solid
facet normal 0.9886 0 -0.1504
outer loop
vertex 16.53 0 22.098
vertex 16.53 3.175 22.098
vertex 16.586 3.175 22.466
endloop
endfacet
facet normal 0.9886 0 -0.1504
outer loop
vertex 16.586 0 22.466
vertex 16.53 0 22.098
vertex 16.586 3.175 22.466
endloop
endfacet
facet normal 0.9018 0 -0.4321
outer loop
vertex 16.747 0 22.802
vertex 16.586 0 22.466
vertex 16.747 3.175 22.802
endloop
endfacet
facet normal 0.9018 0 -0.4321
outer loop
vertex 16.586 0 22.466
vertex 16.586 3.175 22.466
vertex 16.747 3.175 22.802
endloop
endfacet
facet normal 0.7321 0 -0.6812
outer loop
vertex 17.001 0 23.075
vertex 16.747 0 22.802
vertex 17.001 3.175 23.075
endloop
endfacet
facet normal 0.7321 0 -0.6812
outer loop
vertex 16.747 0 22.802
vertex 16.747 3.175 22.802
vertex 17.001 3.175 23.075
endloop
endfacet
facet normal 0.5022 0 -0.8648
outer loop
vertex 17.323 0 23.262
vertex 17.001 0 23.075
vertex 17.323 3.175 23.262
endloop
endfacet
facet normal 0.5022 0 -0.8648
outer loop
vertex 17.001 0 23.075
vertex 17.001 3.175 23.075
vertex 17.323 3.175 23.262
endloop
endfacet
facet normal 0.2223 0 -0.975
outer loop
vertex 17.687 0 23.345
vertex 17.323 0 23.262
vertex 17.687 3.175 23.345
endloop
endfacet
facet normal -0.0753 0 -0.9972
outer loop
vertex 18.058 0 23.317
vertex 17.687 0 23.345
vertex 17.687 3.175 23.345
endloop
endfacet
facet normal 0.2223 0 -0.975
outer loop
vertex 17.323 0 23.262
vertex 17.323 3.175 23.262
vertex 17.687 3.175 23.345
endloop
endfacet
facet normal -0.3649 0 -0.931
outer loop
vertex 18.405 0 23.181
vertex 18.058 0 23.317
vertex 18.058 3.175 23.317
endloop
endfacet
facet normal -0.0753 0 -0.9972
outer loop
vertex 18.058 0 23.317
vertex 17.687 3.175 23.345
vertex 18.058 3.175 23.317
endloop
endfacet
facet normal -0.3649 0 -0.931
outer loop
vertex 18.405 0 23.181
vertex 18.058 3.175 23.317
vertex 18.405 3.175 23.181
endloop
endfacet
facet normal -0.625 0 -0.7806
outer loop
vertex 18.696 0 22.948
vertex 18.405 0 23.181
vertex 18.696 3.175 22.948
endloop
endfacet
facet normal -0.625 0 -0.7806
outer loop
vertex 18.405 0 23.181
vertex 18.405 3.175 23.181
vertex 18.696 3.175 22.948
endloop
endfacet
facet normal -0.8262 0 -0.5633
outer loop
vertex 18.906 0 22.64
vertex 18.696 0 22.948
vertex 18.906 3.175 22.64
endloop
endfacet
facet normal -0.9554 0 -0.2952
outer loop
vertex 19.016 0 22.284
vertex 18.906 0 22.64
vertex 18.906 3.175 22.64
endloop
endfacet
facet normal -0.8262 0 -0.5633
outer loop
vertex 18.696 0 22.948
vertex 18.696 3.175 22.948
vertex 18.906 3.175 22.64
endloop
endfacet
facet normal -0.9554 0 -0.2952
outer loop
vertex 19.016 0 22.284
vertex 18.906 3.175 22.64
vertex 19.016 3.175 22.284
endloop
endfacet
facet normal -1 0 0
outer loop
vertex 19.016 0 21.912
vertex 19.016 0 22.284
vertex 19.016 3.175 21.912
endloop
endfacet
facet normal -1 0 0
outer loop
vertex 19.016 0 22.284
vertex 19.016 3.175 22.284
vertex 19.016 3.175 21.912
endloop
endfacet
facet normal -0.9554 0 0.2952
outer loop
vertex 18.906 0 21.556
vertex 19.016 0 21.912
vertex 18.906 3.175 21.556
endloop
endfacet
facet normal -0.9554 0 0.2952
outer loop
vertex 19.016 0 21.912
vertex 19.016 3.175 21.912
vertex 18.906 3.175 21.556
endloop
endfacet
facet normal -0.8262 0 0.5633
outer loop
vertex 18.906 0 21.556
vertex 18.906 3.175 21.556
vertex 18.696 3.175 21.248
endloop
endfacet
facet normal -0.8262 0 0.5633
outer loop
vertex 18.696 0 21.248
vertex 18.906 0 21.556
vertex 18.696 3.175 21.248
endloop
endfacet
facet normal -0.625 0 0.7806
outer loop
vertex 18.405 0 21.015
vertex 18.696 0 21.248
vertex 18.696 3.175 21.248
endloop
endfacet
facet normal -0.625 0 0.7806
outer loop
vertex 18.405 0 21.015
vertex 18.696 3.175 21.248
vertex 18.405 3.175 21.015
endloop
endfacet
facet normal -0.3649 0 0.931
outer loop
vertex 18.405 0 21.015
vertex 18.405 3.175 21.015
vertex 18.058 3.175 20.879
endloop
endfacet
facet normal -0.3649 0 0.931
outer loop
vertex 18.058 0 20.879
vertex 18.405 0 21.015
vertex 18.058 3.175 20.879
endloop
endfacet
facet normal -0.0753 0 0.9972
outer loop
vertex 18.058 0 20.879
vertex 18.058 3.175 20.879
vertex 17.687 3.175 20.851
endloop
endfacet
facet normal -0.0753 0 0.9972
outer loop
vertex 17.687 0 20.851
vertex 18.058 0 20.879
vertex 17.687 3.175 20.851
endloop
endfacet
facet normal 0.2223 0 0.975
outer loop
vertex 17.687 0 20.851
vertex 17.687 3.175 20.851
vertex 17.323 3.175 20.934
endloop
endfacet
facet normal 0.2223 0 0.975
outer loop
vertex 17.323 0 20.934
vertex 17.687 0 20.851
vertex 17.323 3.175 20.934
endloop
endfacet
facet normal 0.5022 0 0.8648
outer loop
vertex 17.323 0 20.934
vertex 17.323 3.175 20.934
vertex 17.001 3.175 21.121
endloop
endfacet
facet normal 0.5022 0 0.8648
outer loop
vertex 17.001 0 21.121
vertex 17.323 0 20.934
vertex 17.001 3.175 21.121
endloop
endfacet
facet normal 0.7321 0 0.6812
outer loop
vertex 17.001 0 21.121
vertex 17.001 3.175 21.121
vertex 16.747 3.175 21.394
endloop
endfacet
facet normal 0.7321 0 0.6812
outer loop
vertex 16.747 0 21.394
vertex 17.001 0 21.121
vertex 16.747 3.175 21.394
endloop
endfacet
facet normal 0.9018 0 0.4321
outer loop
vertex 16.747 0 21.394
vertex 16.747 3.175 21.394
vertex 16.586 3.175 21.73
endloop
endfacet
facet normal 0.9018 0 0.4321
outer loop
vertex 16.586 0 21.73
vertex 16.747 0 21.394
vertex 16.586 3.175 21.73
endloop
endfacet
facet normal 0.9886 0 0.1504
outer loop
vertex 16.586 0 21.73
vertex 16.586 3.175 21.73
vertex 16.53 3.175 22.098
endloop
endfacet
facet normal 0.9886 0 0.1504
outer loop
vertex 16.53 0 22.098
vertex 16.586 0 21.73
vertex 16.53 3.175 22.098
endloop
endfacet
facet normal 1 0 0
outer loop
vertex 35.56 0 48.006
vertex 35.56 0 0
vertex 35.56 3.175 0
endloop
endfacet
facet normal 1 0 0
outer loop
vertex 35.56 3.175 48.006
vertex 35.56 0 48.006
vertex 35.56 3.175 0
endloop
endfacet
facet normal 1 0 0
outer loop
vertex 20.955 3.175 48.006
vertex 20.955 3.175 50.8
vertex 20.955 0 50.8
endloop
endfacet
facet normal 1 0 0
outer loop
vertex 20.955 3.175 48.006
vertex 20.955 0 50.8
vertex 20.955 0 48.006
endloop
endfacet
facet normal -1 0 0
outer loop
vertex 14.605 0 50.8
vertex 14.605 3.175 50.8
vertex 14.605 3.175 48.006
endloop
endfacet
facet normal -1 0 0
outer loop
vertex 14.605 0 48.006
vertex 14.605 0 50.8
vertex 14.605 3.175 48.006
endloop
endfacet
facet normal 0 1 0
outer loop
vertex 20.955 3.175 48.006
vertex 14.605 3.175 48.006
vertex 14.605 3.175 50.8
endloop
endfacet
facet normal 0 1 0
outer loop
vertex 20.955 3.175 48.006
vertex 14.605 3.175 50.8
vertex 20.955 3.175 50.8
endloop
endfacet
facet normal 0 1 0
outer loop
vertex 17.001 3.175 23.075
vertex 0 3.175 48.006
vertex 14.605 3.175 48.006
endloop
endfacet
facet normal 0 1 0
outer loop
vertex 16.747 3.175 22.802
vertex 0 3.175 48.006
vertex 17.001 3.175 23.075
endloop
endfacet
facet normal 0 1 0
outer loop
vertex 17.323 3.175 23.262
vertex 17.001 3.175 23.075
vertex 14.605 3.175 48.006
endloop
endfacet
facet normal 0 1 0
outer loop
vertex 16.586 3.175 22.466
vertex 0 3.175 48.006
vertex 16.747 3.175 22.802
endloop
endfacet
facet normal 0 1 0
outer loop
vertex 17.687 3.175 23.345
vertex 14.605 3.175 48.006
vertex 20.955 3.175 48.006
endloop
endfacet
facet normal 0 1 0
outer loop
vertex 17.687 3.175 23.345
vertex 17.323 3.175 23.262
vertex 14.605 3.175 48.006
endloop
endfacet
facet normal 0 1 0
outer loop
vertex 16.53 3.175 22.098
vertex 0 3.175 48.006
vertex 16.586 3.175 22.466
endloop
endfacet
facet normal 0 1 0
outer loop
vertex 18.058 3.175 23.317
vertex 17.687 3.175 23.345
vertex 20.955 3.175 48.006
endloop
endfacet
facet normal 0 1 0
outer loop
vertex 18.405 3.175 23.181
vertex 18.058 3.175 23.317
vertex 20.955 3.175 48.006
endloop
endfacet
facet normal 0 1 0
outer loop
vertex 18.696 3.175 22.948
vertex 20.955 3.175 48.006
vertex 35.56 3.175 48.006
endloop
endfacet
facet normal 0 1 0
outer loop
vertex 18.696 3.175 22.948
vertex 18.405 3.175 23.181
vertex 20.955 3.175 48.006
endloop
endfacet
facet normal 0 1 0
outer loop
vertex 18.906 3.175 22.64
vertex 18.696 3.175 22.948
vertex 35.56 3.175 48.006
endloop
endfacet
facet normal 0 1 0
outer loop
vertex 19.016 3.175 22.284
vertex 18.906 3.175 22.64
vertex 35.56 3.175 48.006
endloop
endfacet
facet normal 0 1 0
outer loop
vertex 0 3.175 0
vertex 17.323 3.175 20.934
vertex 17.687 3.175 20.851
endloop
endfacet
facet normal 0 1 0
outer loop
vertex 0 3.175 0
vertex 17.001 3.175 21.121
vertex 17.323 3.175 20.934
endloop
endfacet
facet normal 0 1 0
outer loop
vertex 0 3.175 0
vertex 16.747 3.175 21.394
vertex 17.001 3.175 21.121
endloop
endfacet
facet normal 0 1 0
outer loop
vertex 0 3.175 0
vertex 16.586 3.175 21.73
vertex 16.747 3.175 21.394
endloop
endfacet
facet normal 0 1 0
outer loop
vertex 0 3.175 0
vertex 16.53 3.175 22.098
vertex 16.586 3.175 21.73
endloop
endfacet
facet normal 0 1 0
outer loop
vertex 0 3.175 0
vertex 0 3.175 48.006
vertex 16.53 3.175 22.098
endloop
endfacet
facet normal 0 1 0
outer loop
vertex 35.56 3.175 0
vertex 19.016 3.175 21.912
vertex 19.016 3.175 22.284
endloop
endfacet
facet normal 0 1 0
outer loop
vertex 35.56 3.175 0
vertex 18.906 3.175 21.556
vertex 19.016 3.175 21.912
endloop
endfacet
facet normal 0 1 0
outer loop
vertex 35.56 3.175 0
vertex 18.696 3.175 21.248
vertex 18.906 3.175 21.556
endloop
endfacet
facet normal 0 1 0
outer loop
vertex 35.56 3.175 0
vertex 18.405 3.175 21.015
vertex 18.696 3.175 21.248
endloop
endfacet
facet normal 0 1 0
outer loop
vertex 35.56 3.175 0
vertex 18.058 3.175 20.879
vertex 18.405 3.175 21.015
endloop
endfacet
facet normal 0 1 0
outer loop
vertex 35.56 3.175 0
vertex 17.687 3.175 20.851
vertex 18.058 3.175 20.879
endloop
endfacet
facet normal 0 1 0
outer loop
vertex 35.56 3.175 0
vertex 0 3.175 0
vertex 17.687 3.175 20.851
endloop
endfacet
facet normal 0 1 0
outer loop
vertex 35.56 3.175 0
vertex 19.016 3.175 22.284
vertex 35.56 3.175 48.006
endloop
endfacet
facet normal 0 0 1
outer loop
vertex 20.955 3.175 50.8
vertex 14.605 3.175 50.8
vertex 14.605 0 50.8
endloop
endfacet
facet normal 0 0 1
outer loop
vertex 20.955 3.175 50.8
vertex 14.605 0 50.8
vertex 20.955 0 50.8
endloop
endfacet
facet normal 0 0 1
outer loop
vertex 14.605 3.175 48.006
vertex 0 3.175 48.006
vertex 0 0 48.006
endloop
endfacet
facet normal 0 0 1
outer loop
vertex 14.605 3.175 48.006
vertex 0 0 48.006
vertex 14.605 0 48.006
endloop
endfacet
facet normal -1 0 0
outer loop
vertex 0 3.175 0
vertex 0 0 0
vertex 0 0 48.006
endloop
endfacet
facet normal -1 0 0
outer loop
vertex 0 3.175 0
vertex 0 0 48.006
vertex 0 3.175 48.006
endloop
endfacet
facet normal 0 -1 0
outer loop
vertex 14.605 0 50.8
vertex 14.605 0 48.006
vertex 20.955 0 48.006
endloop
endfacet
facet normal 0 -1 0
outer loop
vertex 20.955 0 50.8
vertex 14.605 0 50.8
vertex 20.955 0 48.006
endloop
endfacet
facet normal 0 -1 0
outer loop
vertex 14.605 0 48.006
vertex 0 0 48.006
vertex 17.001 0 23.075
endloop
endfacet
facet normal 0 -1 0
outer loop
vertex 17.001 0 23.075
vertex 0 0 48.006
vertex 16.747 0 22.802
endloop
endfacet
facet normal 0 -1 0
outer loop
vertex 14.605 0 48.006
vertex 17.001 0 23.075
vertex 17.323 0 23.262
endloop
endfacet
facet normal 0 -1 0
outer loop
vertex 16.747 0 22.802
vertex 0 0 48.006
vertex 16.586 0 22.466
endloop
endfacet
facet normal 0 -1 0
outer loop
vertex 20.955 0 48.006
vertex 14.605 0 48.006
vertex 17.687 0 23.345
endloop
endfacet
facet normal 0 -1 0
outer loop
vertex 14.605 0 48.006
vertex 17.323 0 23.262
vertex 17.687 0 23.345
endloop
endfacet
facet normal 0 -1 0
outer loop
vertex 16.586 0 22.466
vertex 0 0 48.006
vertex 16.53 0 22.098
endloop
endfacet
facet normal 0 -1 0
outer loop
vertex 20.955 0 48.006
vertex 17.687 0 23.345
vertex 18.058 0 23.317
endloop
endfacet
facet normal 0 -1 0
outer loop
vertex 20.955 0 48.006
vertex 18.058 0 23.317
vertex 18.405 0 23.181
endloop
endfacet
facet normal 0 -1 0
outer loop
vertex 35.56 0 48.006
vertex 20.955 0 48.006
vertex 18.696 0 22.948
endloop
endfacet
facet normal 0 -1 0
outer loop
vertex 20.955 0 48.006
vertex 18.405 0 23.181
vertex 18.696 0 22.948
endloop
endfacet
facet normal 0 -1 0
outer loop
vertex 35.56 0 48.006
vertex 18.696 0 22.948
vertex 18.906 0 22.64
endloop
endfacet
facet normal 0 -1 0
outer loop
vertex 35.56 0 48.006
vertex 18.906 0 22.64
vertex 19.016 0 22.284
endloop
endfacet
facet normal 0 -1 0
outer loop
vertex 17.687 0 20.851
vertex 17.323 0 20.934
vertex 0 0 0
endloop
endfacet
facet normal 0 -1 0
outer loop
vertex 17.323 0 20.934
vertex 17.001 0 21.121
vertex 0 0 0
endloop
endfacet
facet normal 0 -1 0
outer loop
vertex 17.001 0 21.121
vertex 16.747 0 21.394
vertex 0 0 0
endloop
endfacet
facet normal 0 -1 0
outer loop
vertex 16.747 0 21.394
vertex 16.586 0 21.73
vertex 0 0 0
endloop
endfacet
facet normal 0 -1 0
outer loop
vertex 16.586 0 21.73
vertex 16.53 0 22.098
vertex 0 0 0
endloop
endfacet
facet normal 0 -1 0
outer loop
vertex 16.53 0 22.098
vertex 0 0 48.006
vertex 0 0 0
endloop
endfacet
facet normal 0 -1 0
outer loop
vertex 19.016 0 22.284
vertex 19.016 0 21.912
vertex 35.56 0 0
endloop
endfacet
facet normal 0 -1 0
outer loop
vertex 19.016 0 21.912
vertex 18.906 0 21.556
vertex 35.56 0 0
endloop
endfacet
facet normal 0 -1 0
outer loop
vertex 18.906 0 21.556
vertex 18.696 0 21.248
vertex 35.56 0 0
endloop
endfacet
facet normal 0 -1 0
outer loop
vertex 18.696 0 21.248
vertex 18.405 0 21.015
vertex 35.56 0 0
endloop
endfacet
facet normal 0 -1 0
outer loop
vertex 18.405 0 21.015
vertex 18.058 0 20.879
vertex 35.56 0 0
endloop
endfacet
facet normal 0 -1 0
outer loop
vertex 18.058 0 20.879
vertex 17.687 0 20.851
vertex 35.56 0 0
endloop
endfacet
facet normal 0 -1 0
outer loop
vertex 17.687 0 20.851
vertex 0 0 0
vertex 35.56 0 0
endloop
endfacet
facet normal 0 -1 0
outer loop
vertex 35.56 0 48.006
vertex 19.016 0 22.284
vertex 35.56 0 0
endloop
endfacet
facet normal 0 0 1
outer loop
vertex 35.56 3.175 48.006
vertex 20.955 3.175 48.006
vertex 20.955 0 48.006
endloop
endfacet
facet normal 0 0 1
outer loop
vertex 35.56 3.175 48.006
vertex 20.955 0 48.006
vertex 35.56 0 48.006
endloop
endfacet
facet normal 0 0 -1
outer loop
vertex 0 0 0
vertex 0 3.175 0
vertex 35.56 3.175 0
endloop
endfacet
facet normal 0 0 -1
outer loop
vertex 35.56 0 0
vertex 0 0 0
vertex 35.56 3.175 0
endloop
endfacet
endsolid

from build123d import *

# Parameters (mm, degrees)
SKETCH1_W           = 35.56
SKETCH1_H           = 3.175
BOSS_EXTRUDE1_DEPTH = 50.8
SKETCH2_R           = 1.25
CUT_EXTRUDE1_DEPTH  = 63.090532491
SKETCH3_W           = 14.605
SKETCH3_H           = 2.794
CUT_EXTRUDE2_DEPTH  = 63.090532491


with BuildPart() as part:
    # Sketch1 → Boss-Extrude1 (new body)
    with BuildSketch(Plane.XY):
        with Locations((17.78, 1.5875)):
            Rectangle(SKETCH1_W, SKETCH1_H)
    extrude(amount=BOSS_EXTRUDE1_DEPTH)

    # Sketch2 → Cut-Extrude1 (cut, through all)
    with BuildSketch(Plane(origin=(0, 3.175, 0), x_dir=(1, 0, 0), z_dir=(0, 1, 0))):
        with Locations(Location((17.78, -22.098, 0), (0, 0, 180))):
            Circle(SKETCH2_R)
    extrude(amount=-CUT_EXTRUDE1_DEPTH, mode=Mode.SUBTRACT)

    # Sketch3 → Cut-Extrude2 (cut, through all)
    with BuildSketch(Plane(origin=(0, 3.175, 0), x_dir=(1, 0, 0), z_dir=(0, 1, 0))):
        with Locations((7.3025, -49.403)):
            Rectangle(SKETCH3_W, SKETCH3_H)
        with Locations((28.2575, -49.403)):
            Rectangle(SKETCH3_W, SKETCH3_H)
    extrude(amount=-CUT_EXTRUDE2_DEPTH, mode=Mode.SUBTRACT)


solid = part.part
